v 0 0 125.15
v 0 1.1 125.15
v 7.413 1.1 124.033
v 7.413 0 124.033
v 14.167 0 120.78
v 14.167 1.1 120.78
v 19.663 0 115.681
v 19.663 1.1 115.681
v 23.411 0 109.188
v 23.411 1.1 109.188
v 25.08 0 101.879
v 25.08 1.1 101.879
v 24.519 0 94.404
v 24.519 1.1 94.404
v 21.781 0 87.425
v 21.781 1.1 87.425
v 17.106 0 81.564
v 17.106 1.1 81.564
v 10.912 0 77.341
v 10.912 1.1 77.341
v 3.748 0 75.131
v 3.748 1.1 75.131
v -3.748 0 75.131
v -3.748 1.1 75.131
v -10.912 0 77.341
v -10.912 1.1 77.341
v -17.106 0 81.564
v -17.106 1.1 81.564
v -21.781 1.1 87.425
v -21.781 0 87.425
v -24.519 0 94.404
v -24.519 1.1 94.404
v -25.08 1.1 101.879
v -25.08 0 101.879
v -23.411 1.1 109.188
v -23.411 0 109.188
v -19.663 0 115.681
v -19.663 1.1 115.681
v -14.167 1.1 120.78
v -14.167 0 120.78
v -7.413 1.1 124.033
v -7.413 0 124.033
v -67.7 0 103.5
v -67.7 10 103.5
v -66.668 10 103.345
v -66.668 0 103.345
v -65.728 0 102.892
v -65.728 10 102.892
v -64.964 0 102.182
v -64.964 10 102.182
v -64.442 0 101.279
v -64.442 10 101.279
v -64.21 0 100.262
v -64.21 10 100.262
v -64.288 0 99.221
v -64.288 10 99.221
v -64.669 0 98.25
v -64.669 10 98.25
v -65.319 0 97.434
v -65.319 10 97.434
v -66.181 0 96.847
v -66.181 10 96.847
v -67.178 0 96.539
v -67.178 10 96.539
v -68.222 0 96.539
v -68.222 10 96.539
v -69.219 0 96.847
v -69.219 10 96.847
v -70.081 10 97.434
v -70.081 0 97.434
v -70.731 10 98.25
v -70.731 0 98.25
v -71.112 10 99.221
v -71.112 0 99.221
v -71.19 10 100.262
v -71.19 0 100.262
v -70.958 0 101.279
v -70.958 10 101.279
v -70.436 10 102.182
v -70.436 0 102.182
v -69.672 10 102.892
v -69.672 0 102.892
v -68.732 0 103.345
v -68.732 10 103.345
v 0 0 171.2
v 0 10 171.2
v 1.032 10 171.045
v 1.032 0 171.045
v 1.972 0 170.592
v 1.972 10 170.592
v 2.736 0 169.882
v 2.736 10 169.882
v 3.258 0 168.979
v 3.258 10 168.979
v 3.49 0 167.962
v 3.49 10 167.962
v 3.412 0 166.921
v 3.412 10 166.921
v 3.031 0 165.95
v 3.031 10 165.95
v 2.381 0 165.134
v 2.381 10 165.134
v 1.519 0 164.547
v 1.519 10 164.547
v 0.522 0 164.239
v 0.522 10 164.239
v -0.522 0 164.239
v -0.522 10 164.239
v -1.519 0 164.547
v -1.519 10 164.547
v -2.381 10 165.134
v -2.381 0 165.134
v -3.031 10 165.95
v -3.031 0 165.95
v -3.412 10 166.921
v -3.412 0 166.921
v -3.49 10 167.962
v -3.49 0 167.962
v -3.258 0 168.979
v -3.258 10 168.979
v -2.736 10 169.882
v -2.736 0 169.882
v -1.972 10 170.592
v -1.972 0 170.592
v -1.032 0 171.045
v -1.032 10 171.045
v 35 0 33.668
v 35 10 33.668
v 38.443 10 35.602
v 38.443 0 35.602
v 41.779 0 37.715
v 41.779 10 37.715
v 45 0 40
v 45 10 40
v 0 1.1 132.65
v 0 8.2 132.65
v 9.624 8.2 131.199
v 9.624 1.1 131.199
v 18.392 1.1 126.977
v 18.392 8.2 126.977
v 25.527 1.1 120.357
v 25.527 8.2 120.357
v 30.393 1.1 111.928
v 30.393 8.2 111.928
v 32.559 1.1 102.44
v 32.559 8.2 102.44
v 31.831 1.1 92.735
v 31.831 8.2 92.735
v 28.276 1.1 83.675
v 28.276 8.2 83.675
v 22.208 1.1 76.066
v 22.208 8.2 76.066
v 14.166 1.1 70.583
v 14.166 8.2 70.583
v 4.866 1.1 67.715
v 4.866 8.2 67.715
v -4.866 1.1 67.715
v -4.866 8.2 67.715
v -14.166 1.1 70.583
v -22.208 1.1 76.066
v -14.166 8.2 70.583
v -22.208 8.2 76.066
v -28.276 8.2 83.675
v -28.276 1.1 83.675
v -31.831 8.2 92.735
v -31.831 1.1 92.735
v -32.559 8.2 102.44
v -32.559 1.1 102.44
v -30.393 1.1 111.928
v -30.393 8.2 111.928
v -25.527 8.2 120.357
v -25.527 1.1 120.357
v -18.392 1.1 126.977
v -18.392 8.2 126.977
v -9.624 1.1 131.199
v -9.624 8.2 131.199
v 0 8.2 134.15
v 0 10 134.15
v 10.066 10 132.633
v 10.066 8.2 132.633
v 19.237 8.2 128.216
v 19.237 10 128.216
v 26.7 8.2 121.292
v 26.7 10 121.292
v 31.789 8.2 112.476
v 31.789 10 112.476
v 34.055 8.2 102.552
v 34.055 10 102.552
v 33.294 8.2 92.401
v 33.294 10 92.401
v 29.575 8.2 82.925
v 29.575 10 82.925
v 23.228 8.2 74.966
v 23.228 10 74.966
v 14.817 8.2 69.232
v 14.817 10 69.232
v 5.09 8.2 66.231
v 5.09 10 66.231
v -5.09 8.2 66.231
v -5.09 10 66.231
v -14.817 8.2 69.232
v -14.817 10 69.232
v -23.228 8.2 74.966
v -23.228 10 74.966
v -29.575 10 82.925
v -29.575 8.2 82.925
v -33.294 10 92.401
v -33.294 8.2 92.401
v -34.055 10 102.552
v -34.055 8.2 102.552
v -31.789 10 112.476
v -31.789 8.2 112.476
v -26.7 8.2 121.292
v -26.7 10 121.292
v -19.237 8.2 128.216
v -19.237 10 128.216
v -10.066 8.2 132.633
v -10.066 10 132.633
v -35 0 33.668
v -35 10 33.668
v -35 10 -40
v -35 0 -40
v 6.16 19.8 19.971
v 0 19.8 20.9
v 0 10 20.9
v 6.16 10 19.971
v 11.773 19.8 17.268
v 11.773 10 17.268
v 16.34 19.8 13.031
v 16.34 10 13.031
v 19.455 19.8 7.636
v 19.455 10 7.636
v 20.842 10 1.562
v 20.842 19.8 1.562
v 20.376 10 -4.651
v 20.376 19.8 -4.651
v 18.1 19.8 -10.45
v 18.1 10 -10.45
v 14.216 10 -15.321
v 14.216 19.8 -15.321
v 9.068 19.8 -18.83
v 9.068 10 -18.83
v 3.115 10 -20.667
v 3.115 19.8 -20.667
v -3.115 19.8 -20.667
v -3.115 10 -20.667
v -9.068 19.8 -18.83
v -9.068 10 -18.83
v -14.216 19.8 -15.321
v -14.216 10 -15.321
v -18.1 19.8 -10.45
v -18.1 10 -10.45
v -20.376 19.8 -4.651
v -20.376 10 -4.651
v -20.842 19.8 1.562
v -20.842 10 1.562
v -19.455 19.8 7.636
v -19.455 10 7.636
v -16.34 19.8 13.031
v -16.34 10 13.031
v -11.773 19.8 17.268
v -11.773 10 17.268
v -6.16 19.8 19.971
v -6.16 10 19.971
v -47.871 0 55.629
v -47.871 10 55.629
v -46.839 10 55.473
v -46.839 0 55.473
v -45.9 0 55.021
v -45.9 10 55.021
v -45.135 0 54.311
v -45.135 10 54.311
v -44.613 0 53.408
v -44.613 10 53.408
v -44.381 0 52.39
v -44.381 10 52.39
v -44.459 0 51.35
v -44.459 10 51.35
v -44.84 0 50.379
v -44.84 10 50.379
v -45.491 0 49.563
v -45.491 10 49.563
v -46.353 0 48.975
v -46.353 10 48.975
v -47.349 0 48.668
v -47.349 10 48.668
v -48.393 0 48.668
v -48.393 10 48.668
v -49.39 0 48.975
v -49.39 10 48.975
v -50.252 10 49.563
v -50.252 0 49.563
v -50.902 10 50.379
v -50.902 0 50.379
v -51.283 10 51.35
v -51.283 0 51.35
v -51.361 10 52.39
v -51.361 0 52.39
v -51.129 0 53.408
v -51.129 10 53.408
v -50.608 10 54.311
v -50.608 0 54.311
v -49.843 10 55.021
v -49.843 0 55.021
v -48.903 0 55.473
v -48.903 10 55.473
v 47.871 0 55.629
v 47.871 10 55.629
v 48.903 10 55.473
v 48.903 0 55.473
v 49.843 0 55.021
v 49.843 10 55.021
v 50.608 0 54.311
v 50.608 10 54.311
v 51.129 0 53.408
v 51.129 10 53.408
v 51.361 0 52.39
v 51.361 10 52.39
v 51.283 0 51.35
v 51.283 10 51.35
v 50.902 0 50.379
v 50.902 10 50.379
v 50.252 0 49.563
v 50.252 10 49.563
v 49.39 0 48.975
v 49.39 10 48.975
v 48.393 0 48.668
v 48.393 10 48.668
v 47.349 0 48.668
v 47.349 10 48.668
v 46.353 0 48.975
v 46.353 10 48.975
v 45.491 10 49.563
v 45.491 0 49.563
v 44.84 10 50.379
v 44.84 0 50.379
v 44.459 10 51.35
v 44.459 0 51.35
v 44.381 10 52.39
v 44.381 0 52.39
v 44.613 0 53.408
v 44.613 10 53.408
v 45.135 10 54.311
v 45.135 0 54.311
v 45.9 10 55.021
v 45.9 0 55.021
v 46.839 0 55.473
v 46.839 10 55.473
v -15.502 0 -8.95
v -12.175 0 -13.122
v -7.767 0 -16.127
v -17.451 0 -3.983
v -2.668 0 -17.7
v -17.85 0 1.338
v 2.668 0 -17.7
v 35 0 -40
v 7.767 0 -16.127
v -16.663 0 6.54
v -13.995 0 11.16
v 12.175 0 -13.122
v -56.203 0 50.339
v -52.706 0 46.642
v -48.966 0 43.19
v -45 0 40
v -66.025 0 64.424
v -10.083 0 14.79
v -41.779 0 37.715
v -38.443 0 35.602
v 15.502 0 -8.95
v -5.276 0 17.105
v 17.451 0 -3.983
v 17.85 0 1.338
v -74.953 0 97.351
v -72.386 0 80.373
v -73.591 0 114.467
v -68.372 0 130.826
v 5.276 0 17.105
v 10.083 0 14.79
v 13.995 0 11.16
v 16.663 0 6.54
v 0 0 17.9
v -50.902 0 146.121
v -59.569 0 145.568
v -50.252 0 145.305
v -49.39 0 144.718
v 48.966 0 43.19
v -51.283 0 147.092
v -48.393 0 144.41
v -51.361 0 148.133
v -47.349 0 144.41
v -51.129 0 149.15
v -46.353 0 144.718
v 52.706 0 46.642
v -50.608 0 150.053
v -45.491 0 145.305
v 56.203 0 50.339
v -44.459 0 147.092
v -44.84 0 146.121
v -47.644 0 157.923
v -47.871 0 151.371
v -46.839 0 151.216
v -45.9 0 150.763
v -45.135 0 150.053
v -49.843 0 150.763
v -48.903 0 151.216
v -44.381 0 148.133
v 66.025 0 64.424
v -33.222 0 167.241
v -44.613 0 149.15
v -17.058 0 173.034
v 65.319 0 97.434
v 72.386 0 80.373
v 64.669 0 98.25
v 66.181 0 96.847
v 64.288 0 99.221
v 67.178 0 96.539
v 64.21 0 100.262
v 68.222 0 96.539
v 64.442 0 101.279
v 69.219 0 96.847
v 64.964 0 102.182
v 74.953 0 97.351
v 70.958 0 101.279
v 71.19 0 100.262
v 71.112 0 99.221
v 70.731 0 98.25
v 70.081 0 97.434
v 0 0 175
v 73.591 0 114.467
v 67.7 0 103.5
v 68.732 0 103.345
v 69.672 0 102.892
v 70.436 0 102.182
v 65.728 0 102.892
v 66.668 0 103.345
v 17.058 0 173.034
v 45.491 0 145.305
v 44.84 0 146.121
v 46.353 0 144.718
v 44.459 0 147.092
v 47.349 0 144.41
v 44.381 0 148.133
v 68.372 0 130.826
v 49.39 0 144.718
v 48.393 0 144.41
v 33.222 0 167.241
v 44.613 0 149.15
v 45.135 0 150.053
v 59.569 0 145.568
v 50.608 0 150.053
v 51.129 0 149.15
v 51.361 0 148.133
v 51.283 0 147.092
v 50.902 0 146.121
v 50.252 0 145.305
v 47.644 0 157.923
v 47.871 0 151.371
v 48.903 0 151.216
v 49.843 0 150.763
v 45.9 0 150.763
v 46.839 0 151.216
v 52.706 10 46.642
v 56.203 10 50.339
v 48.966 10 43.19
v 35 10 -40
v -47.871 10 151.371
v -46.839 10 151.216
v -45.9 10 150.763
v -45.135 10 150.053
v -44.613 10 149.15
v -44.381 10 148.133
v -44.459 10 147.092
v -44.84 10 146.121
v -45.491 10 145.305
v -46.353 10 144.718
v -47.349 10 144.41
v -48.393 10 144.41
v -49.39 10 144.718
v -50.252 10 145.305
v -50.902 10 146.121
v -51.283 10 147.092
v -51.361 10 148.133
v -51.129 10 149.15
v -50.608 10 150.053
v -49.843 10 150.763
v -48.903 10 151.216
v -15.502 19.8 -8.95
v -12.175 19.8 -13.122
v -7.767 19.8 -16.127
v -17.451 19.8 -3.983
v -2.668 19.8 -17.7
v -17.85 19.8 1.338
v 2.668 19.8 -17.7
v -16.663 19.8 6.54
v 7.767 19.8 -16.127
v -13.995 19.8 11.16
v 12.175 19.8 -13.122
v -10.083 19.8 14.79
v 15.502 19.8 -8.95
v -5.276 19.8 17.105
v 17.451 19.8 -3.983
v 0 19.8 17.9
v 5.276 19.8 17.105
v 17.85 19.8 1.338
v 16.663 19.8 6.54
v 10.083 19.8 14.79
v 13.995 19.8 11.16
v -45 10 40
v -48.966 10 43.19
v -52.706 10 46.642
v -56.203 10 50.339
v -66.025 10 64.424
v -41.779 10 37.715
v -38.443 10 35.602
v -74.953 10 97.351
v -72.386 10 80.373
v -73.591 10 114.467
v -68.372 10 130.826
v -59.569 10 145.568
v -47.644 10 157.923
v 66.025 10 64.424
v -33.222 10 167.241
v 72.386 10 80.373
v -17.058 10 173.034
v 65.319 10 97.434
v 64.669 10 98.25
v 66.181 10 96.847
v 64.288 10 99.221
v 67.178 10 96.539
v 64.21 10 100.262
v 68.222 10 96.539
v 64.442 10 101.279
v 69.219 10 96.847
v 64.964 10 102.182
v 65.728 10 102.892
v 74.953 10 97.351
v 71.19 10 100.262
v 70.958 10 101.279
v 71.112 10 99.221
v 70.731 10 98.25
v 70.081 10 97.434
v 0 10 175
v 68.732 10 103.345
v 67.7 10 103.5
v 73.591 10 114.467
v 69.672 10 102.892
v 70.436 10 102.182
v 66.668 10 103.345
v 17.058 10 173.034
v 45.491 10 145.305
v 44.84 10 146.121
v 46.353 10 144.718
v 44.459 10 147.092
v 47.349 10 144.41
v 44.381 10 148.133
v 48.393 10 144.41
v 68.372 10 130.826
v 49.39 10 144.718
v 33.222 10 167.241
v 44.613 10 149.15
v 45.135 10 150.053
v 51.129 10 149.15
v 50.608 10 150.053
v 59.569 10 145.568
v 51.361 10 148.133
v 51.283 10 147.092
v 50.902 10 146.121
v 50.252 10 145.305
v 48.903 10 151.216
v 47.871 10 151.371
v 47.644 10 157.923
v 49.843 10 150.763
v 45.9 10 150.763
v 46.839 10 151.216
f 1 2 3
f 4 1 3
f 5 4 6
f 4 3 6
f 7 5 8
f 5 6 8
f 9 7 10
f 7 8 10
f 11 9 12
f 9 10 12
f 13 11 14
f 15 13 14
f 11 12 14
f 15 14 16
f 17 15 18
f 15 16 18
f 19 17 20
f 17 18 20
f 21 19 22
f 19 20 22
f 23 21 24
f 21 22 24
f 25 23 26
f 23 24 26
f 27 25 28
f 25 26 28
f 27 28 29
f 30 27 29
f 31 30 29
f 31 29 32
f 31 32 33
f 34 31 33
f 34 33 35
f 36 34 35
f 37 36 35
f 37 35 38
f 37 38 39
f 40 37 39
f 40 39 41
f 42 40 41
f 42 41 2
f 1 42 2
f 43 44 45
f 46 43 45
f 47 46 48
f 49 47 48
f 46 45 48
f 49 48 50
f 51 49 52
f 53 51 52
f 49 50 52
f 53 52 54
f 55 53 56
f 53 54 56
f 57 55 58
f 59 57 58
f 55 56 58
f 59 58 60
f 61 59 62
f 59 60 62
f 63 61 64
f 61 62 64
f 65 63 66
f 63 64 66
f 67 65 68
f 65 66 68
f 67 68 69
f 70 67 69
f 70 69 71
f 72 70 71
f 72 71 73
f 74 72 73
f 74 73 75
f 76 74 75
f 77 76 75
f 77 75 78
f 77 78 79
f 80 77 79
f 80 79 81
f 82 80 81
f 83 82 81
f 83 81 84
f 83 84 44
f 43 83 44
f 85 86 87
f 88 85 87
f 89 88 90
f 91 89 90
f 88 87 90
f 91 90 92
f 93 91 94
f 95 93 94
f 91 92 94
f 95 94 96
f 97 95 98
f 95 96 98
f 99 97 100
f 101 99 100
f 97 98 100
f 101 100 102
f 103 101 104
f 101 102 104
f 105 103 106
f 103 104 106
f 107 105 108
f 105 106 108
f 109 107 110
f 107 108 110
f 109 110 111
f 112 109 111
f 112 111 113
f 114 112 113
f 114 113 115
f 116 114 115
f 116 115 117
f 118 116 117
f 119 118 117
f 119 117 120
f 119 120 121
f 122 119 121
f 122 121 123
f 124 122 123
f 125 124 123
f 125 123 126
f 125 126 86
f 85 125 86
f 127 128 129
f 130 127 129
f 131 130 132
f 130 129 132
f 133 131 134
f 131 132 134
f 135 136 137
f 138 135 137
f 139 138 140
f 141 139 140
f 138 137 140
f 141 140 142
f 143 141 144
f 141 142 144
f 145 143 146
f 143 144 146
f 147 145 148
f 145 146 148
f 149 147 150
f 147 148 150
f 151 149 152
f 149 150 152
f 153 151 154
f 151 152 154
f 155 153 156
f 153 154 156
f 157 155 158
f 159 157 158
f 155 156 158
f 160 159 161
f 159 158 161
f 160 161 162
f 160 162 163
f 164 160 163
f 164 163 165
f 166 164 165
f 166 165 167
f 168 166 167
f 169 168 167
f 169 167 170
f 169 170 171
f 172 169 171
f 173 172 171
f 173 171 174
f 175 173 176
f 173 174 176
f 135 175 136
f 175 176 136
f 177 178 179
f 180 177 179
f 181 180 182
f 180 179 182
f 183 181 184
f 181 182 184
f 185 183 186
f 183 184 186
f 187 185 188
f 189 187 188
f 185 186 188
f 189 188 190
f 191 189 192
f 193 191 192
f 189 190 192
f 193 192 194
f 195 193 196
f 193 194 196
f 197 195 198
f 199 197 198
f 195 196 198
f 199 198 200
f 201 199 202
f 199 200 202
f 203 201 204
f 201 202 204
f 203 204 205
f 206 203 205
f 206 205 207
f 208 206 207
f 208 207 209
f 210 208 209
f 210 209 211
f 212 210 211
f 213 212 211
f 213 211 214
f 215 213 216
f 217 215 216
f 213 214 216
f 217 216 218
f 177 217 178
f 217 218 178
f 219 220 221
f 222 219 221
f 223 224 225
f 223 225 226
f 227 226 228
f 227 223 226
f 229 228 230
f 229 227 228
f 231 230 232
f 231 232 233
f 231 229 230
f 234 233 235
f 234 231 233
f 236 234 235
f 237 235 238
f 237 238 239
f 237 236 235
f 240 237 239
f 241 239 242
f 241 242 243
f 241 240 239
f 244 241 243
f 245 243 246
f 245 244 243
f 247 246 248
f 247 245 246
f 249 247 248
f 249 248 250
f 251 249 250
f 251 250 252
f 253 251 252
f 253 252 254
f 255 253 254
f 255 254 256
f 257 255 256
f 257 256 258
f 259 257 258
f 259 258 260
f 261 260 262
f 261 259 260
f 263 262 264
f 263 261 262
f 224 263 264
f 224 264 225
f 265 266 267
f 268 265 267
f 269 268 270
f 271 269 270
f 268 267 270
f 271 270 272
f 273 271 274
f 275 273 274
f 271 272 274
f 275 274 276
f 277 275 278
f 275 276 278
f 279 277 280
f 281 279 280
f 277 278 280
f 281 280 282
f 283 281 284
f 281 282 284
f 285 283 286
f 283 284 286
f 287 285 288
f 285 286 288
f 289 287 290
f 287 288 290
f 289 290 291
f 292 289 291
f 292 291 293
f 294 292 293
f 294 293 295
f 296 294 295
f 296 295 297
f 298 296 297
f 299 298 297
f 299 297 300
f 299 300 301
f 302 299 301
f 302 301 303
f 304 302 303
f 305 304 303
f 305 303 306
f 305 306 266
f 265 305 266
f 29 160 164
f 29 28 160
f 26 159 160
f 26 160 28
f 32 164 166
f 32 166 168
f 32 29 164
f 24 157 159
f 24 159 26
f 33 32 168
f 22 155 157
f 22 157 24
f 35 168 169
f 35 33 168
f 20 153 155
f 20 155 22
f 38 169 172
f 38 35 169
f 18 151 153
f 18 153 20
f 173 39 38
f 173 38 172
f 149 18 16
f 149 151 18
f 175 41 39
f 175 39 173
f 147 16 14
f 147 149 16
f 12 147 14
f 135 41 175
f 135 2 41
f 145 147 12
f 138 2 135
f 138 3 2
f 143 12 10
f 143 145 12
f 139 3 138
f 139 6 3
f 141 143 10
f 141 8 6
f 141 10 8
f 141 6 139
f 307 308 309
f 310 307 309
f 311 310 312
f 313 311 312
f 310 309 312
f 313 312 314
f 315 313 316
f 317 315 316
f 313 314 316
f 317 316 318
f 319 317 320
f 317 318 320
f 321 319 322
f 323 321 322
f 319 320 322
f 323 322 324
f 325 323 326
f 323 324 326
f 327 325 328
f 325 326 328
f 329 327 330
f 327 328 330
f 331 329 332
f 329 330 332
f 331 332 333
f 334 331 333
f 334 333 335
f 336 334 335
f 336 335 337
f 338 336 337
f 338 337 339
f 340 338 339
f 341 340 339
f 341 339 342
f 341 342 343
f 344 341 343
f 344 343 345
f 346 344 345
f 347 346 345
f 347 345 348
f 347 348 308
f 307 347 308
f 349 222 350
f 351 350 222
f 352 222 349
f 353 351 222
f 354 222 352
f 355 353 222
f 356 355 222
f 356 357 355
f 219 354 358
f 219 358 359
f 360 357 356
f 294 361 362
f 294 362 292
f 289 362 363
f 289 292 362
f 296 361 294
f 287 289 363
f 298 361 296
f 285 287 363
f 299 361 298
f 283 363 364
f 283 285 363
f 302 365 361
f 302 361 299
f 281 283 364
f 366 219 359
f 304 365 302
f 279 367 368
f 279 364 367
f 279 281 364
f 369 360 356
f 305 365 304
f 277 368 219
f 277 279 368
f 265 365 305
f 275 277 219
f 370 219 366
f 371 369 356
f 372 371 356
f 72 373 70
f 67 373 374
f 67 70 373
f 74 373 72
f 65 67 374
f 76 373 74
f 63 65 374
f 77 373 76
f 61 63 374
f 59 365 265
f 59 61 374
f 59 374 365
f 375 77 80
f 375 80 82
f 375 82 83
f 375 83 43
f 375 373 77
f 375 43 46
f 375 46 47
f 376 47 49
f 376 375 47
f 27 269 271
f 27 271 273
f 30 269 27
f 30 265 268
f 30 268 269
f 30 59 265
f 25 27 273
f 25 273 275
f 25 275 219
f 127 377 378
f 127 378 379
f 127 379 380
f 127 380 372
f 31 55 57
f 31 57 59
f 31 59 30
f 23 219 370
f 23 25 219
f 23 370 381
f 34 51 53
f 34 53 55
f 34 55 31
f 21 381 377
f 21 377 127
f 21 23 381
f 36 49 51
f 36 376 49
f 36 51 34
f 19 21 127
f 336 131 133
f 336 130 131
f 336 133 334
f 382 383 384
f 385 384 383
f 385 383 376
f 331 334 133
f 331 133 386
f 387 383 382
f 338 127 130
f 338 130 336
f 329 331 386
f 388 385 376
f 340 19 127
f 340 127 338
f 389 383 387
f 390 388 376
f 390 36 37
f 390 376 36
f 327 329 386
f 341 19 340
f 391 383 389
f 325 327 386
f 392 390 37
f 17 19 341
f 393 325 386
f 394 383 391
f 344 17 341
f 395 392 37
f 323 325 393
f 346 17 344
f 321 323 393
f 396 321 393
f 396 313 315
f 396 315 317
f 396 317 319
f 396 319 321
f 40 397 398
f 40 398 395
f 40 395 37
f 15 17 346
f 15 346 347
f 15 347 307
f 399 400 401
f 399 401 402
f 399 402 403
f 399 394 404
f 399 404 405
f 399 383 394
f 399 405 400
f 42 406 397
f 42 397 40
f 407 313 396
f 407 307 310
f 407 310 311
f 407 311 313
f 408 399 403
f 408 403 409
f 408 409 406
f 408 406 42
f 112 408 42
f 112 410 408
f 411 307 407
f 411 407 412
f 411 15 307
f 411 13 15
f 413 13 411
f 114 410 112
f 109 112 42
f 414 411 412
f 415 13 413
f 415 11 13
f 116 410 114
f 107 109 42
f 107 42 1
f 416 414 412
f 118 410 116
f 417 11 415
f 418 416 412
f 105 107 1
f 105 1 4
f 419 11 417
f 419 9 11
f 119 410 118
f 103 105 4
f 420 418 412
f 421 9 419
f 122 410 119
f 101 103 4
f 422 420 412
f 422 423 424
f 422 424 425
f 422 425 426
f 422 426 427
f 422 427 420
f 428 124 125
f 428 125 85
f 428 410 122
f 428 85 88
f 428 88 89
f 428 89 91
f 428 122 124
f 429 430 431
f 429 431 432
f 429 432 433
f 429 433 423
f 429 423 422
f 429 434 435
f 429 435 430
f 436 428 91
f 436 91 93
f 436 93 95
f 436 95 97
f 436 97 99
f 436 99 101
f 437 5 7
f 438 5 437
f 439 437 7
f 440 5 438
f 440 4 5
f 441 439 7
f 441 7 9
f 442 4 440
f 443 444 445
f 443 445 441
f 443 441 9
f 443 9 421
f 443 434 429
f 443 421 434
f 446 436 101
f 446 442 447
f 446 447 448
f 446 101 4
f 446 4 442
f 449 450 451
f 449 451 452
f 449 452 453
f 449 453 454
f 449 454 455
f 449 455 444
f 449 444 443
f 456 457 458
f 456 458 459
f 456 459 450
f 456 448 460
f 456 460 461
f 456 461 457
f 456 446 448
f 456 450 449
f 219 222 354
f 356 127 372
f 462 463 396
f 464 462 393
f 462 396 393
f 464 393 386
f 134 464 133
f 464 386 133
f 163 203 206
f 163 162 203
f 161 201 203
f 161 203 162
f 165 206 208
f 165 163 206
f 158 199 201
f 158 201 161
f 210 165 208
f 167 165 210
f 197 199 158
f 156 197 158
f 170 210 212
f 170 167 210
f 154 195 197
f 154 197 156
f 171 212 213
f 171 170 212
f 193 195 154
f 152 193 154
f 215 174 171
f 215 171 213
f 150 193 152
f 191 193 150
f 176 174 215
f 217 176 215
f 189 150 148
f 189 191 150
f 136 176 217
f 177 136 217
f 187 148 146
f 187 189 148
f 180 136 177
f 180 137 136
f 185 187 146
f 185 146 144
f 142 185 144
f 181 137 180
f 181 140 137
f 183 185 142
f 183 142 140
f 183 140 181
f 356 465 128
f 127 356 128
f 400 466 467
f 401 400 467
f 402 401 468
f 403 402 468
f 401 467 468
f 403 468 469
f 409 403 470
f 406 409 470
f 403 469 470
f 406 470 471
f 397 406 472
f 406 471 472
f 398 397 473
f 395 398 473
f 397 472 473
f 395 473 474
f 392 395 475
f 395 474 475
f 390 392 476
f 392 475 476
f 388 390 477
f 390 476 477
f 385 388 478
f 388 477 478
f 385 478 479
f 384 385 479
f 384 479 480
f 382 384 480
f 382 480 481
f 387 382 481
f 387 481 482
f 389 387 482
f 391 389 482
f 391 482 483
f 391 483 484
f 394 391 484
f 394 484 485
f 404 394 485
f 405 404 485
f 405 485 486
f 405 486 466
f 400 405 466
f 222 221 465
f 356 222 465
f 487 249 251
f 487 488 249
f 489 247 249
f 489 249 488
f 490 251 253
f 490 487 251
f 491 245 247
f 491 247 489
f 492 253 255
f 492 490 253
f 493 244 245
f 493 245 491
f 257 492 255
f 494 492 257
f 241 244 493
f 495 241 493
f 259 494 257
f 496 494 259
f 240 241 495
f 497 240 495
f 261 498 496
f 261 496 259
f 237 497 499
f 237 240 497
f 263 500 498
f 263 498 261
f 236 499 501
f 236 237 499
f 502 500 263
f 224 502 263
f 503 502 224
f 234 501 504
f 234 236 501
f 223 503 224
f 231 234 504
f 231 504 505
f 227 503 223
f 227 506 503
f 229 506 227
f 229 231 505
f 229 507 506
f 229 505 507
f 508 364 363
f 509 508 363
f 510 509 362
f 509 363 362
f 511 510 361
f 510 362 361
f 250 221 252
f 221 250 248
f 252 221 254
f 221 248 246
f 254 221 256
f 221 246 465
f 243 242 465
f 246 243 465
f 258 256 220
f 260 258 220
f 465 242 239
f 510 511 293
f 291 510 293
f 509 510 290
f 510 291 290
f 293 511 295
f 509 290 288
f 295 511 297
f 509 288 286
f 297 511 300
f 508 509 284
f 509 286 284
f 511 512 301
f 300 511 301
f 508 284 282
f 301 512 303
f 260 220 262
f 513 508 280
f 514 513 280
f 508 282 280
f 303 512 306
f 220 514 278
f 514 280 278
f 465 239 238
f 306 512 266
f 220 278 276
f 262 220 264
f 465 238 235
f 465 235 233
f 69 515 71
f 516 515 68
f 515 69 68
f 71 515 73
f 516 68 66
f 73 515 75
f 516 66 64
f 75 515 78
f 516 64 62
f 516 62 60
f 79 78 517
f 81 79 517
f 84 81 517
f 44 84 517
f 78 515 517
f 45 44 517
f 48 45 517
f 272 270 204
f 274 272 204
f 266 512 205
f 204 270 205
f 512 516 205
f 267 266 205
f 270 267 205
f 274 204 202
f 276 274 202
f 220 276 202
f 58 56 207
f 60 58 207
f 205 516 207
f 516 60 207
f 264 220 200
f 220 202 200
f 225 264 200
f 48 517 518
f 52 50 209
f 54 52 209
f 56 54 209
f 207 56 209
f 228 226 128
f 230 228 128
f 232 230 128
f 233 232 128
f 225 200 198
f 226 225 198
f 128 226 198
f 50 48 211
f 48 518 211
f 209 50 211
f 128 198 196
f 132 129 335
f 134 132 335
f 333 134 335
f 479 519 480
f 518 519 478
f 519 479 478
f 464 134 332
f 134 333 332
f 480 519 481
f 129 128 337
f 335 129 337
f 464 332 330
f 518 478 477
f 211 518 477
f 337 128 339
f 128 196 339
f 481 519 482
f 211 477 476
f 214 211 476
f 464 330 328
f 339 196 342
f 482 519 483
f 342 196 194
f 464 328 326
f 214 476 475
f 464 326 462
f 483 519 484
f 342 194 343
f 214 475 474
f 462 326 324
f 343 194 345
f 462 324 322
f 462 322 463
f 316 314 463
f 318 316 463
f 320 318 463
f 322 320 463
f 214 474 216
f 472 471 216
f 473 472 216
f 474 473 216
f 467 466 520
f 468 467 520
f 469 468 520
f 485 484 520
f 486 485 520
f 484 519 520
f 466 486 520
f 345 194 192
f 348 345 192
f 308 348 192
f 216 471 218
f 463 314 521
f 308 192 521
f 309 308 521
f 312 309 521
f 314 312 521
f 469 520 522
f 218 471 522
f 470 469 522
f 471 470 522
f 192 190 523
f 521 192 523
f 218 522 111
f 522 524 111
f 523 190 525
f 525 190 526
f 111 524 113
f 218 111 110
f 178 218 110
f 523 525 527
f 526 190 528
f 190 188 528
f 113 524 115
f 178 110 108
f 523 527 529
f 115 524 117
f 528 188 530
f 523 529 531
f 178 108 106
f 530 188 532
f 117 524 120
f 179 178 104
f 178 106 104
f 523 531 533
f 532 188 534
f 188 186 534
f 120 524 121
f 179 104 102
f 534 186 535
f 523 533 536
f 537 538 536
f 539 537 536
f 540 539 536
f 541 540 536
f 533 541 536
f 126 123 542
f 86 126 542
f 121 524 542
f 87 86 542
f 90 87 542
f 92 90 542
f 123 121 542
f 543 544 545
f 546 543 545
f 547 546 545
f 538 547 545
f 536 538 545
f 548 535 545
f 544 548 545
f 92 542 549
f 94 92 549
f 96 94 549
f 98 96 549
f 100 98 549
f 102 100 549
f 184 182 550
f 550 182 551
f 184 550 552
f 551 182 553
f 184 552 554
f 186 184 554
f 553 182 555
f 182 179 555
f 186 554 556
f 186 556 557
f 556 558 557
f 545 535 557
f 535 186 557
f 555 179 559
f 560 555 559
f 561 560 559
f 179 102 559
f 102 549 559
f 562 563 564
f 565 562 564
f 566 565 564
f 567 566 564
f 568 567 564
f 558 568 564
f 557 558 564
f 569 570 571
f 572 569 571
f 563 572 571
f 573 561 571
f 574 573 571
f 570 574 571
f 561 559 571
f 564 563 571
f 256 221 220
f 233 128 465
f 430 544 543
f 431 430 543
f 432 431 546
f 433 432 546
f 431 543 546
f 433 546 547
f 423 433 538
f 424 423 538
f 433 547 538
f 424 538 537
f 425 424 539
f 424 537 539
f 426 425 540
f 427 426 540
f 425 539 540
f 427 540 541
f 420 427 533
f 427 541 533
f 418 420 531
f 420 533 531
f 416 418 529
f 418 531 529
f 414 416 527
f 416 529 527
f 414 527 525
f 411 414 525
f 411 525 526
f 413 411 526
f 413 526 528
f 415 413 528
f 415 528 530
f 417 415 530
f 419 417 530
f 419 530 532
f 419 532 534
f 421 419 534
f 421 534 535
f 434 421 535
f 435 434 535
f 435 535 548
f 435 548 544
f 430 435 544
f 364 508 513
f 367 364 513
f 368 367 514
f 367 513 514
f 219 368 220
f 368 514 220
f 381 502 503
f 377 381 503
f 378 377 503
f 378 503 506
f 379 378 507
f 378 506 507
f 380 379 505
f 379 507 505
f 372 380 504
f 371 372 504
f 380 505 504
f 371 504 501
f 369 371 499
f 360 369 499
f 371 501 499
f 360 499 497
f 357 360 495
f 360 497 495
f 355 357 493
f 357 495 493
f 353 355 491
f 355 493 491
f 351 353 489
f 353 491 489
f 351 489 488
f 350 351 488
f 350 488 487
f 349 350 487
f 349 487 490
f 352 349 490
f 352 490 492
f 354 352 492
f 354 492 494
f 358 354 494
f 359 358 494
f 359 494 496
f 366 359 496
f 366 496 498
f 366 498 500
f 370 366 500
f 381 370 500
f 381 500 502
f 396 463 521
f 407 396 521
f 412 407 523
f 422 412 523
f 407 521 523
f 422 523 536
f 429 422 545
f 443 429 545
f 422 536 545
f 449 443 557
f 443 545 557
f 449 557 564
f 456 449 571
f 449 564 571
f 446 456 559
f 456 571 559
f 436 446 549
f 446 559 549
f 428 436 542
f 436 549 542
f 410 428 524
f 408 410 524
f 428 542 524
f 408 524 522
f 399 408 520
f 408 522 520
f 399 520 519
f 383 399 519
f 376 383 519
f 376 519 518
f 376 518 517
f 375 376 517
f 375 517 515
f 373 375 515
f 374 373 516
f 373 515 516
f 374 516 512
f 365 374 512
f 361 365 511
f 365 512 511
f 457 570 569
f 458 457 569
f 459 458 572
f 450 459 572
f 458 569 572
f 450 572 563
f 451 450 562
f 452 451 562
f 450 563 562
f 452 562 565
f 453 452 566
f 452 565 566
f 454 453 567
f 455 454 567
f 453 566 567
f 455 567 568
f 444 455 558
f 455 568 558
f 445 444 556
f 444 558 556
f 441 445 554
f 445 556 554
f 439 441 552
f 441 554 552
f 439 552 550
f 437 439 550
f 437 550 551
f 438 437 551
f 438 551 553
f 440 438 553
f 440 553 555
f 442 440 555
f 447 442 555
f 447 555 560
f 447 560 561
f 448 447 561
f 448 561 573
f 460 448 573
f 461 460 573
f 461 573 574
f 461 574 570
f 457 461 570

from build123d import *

# Parameters (mm, degrees)
EXTRUDE_1_DEPTH     = 10
SKETCH_2_R          = 17.9
SKETCH_2_R_2        = 25.15
CUT_EXTRUDE_1_DEPTH = 178.623196683
SKETCH_4_R          = 34.15
CUT_EXTRUDE_2_DEPTH = 1.8
SKETCH_5_R          = 32.65
CUT_EXTRUDE_3_DEPTH = 7.1
EXTRUDE_START       = 9.8
SKETCH_6_R          = 20.9
SKETCH_6_R_2        = 17.9
EXTRUDE_2_DEPTH     = 9.8
EXTRUDE_START_2     = -10
EXTRUDE_3_DEPTH     = 10
CUT_EXTRUDE_4_DEPTH = 192.421106464
SKETCH_11_R         = 3.5
CUT_EXTRUDE_5_DEPTH = 191.656759649
CUT_EXTRUDE_6_DEPTH = 191.656759649


with BuildPart() as part:
    # 草图1 → 凸台-拉伸1 (new body)
    with BuildSketch(Plane(origin=(0, 0, 0), x_dir=(1, 0, 0), z_dir=(0, 1, 0))):
        with BuildLine():
            Line((63.686733312, -87), (44.09081537, 9))
            ThreePointArc((44.09081537, 9), (0, 45), (-44.09081537, 9))
            Line((-44.09081537, 9), (-63.686733312, -87))
            ThreePointArc((-63.686733312, -87), (0, -165), (63.686733312, -87))
        make_face()
    extrude(amount=EXTRUDE_1_DEPTH)

    # 草图2 → 切除-拉伸1 (cut, through all)
    with BuildSketch(Plane(origin=(0, 10, 0), x_dir=(1, 0, 0), z_dir=(0, 1, 0))):
        with Locations(Location((0, 0, 0), (0, 0, 270))):
            Circle(SKETCH_2_R)
        with Locations(Location((0, -100, 0), (0, 0, 270))):
            Circle(SKETCH_2_R_2)
    extrude(amount=-CUT_EXTRUDE_1_DEPTH, mode=Mode.SUBTRACT)

    # 草图4 → 切除-拉伸2 (cut)
    with BuildSketch(Plane(origin=(0, 10, 0), x_dir=(1, 0, 0), z_dir=(0, 1, 0))):
        with Locations(Location((0, -100, 0), (0, 0, 270))):
            Circle(SKETCH_4_R)
    extrude(amount=-CUT_EXTRUDE_2_DEPTH, mode=Mode.SUBTRACT)

    # 草图5 → 切除-拉伸3 (cut)
    with BuildSketch(Plane(origin=(0, 8.2, 0), x_dir=(1, 0, 0), z_dir=(0, 1, 0))):
        with Locations(Location((0, -100, 0), (0, 0, 270))):
            Circle(SKETCH_5_R)
    extrude(amount=-CUT_EXTRUDE_3_DEPTH, mode=Mode.SUBTRACT)

    # 草图6 → 凸台-拉伸2 (add)
    with BuildSketch(Plane(origin=(0, 10, 0), x_dir=(1, 0, 0), z_dir=(0, 1, 0)).offset(EXTRUDE_START)):
        with Locations(Location((0, 0, 0), (0, 0, 270))):
            Circle(SKETCH_6_R)
        with Locations(Location((0, 0, 0), (0, 0, 270))):
            Circle(SKETCH_6_R_2, mode=Mode.SUBTRACT)
    extrude(amount=-EXTRUDE_2_DEPTH)

    # 草图7 → 凸台-拉伸3 (add)
    with BuildSketch(Plane.XZ.offset(EXTRUDE_START_2)):
        with BuildLine():
            Line((-44.09081537, -9), (-45, -4.54592315))
            Line((-45, -4.54592315), (-45, -40))
            Line((-45, -40), (-20.615528128, -40))
            ThreePointArc((-20.615528128, -40), (-35.874471734, -27.166565439), (-44.09081537, -9))
        make_face()
        with BuildLine():
            ThreePointArc((56.203418539, 50.33939444), (0, 175), (-56.203418539, 50.33939444))
            Line((-56.203418539, 50.33939444), (-63.686733312, 87))
            ThreePointArc((-63.686733312, 87), (0, 165), (63.686733312, 87))
            Line((63.686733312, 87), (56.203418539, 50.33939444))
        make_face()
        with BuildLine():
            Line((45, -40), (45, -4.54592315))
            Line((45, -4.54592315), (44.09081537, -9))
            ThreePointArc((44.09081537, -9), (35.874471734, -27.166565439), (20.615528128, -40))
            Line((20.615528128, -40), (45, -40))
        make_face()
    extrude(amount=EXTRUDE_3_DEPTH)

    # 草图8 → 切除-拉伸4 (cut, through all)
    with BuildSketch(Plane.XZ):
        with BuildLine():
            Line((-45, -4.54592315), (-45, 40))
            ThreePointArc((-45, 40), (-50.865103463, 44.884292169), (-56.203418539, 50.33939444))
            Line((-56.203418539, 50.33939444), (-45, -4.54592315))
        make_face()
        with BuildLine():
            ThreePointArc((56.203418539, 50.33939444), (50.865103463, 44.884292169), (45, 40))
            Line((45, 40), (45, -4.54592315))
            Line((45, -4.54592315), (56.203418539, 50.33939444))
        make_face()
        with BuildLine():
            Line((20.615528128, -40), (-20.615528128, -40))
            ThreePointArc((-20.615528128, -40), (0, -45), (20.615528128, -40))
        make_face()
    extrude(amount=-CUT_EXTRUDE_4_DEPTH, mode=Mode.SUBTRACT)

    # 草图11 → 切除-拉伸5 (cut, through all)
    with BuildSketch(Plane(origin=(0, 10, 0), x_dir=(1, 0, 0), z_dir=(0, 1, 0))):
        with Locations(Location((0, -167.7, 0), (0, 0, 270))):
            Circle(SKETCH_11_R)
        with Locations(Location((47.871129086, -147.871129086, 0), (0, 0, 270))):
            Circle(SKETCH_11_R)
        with Locations(Location((-47.871129086, -147.871129086, 0), (0, 0, 270))):
            Circle(SKETCH_11_R)
        with Locations(Location((-67.7, -100, 0), (0, 0, 270))):
            Circle(SKETCH_11_R)
        with Locations(Location((-47.871129086, -52.128870914, 0), (0, 0, 270))):
            Circle(SKETCH_11_R)
        with Locations(Location((67.7, -100, 0), (0, 0, 270))):
            Circle(SKETCH_11_R)
        with Locations(Location((47.871129086, -52.128870914, 0), (0, 0, 270))):
            Circle(SKETCH_11_R)
    extrude(amount=-CUT_EXTRUDE_5_DEPTH, mode=Mode.SUBTRACT)

    # 草图12 → 切除-拉伸6 (cut, through all)
    with BuildSketch(Plane(origin=(0, 10, 0), x_dir=(1, 0, 0), z_dir=(0, 1, 0))):
        with BuildLine():
            ThreePointArc((-45, -40), (-40.12511839, -36.636170616), (-35, -33.667504193))
            Line((-35, -33.667504193), (-35, 40))
            Line((-35, 40), (-45, 40))
            Line((-45, 40), (-45, -40))
        make_face()
        with BuildLine():
            Line((35, 40), (35, -33.667504193))
            ThreePointArc((35, -33.667504193), (40.12511839, -36.636170616), (45, -40))
            Line((45, -40), (45, 40))
            Line((45, 40), (35, 40))
        make_face()
    extrude(amount=-CUT_EXTRUDE_6_DEPTH, mode=Mode.SUBTRACT)


solid = part.part
